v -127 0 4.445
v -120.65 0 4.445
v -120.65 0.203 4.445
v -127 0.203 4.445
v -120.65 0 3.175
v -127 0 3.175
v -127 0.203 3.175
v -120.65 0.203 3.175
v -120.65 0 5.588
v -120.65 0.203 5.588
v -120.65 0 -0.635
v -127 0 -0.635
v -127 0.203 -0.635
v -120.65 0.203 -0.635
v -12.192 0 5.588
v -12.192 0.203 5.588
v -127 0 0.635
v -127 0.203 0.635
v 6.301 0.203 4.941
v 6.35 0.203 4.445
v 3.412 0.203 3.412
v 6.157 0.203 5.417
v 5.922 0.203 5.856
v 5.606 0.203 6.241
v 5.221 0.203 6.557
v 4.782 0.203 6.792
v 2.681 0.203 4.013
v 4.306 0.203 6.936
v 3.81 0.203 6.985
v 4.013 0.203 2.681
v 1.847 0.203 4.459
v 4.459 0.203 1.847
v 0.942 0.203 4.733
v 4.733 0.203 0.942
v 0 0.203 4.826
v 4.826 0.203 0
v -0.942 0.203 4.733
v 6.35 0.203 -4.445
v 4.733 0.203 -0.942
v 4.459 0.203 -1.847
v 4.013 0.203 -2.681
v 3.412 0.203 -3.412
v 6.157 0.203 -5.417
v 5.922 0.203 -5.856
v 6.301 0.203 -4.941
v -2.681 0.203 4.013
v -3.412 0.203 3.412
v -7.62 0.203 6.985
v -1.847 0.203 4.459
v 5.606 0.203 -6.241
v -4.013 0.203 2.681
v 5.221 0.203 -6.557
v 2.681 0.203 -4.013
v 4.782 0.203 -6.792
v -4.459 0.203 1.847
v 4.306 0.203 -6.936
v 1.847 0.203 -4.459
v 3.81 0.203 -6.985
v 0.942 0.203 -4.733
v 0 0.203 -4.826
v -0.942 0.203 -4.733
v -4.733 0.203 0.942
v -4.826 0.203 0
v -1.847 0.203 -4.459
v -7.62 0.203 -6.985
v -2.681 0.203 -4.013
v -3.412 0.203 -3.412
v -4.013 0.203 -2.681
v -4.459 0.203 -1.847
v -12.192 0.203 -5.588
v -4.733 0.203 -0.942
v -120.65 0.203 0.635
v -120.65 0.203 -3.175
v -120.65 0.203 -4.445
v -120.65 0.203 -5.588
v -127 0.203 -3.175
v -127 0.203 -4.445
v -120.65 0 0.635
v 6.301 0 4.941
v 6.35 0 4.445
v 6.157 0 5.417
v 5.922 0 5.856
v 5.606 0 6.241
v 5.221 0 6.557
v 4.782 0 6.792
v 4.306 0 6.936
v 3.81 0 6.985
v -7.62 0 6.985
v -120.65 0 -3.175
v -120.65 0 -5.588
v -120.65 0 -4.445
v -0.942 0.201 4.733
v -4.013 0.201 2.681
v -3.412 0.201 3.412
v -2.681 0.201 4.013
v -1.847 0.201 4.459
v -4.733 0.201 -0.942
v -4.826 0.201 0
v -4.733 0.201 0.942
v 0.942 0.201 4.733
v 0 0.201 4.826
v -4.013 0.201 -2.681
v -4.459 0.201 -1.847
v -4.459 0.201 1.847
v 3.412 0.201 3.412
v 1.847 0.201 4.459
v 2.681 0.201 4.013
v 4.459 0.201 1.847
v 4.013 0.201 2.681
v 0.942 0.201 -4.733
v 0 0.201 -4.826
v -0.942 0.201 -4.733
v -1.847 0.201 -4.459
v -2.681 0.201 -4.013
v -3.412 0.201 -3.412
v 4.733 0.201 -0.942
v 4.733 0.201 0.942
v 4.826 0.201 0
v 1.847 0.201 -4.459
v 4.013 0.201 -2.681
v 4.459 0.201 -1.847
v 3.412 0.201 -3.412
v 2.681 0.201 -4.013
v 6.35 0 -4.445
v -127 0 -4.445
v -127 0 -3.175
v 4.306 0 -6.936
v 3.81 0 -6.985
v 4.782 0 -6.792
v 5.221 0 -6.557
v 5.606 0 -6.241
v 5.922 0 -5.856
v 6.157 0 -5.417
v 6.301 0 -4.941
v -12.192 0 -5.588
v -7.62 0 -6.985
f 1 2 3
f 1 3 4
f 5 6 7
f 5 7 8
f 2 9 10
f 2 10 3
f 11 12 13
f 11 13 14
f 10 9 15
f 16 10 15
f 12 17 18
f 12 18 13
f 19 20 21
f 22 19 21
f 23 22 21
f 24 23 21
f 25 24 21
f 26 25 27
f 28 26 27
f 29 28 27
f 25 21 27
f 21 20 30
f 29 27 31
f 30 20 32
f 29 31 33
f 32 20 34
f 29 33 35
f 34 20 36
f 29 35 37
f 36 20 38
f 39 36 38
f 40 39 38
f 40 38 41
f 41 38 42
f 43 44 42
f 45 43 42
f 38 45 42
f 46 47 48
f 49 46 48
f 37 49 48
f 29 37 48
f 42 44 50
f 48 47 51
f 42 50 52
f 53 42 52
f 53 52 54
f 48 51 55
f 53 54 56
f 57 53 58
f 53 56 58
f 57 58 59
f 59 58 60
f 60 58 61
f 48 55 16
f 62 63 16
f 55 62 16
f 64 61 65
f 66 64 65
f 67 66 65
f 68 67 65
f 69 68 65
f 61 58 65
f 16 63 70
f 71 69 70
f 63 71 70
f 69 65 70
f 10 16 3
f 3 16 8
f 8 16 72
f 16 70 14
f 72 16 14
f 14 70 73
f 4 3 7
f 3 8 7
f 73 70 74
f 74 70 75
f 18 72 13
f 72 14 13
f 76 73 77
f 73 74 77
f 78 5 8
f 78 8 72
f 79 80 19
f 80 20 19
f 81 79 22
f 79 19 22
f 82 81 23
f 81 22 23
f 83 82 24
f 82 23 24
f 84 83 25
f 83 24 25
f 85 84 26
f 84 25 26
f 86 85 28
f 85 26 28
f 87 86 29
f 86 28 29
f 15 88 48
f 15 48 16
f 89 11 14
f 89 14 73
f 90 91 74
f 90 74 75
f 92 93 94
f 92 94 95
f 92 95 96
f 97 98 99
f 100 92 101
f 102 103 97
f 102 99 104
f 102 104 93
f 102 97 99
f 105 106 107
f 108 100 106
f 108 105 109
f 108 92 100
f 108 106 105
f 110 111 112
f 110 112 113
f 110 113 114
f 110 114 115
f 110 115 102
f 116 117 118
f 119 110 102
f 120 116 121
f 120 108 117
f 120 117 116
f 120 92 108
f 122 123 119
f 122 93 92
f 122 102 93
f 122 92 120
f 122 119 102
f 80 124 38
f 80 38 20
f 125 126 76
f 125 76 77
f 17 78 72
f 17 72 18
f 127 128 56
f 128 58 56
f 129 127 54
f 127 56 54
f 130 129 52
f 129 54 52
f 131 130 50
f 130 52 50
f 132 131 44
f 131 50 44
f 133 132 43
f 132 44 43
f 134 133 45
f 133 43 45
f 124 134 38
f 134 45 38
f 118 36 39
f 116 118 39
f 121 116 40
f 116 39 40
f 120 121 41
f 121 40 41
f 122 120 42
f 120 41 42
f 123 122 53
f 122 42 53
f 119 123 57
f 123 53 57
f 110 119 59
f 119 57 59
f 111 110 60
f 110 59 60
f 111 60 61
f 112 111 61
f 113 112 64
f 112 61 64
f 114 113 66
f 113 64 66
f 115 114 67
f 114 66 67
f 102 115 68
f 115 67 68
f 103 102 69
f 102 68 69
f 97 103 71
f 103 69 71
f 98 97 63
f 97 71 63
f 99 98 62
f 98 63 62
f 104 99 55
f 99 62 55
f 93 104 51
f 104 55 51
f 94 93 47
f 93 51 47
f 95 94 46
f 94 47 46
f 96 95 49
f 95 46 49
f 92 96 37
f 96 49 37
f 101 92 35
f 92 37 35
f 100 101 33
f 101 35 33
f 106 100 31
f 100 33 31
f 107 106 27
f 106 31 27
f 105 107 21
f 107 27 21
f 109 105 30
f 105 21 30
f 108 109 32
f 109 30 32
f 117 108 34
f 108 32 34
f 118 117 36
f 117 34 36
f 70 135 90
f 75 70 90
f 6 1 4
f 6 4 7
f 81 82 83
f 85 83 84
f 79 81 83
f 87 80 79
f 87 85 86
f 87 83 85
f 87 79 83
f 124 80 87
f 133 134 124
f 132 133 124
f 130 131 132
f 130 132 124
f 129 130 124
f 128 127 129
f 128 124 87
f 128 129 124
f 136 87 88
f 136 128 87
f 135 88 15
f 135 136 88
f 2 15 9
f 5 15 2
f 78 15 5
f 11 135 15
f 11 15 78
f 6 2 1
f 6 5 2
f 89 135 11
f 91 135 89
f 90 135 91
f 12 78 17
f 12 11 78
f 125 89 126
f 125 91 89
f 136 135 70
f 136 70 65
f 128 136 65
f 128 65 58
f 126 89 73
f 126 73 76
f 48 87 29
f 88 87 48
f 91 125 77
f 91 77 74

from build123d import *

# Parameters (mm, degrees)
BOSS_EXTRUDE1_DEPTH = 0.2032
SKETCH2_R           = 4.826
CUT_EXTRUDE1_DEPTH  = 0.00254
FILLET1_R           = 2.54


with BuildPart() as part:
    # Sketch1 → Boss-Extrude1 (new body)
    with BuildSketch(Plane(origin=(0, 0, 0), x_dir=(1, 0, 0), z_dir=(0, 1, 0))):
        Polygon((-120.65, -0.635), (-127, -0.635), (-127, 0.635), (-120.65, 0.635), (-120.65, 3.175), (-127, 3.175), (-127, 4.445), (-120.65, 4.445), (-120.65, 5.588), (-108.748705113, 5.588), (-12.192, 5.588), (-7.62, 6.985), (6.35, 6.985), (6.35, -6.985), (-7.62, -6.985), (-12.192, -5.588), (-108.748705113, -5.588), (-120.65, -5.588), (-120.65, -4.445), (-127, -4.445), (-127, -3.175), (-120.65, -3.175), align=None)
    extrude(amount=BOSS_EXTRUDE1_DEPTH)

    # Sketch2 → Cut-Extrude1 (cut)
    with BuildSketch(Plane(origin=(0, 0.2032, 0), x_dir=(1, 0, 0), z_dir=(0, 1, 0))):
        Circle(SKETCH2_R)
    extrude(amount=-CUT_EXTRUDE1_DEPTH, mode=Mode.SUBTRACT)

    # Fillet1
    fillet1_edges = [part.edges().sort_by_distance(p)[0] for p in [
        (6.35, 0.1016, -6.985),
        (6.35, 0.1016, 6.985),
    ]]
    fillet(fillet1_edges, radius=FILLET1_R)


solid = part.part
